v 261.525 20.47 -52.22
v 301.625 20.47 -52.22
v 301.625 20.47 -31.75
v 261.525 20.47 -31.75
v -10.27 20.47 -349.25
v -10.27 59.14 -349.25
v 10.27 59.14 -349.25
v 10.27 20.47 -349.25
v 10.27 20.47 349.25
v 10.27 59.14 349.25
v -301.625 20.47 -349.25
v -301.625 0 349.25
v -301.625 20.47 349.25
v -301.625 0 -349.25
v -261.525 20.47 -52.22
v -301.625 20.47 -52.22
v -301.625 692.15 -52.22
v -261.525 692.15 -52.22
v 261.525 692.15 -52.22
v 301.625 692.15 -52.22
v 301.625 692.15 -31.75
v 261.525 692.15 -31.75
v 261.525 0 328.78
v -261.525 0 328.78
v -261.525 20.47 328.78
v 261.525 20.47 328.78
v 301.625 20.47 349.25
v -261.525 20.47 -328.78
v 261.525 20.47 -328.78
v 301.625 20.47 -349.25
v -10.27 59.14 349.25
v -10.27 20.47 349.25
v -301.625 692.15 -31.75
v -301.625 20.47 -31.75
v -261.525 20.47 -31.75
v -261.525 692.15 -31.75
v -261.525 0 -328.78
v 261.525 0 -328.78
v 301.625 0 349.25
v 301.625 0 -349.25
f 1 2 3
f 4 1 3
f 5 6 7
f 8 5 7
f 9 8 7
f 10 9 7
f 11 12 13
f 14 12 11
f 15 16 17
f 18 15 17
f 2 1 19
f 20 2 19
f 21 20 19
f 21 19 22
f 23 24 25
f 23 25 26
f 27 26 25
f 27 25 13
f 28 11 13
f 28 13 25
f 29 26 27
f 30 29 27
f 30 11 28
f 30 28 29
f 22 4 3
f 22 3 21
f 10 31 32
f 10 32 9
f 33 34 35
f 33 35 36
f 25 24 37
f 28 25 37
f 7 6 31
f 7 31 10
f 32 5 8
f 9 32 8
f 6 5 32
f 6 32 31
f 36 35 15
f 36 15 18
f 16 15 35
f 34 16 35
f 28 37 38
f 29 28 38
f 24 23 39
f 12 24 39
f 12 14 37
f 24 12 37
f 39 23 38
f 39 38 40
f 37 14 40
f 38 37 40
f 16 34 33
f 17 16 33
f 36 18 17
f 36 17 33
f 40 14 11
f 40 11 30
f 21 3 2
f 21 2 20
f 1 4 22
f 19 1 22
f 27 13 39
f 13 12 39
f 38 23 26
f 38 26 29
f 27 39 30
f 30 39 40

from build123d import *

# Parameters (mm, degrees)
SKETCH1_W           = 603.25
SKETCH1_H           = 698.5
SKETCH1_W_2         = 523.05
SKETCH1_H_2         = 657.56
BOSS_EXTRUDE1_DEPTH = 20.47
SKETCH2_W           = 40.1
SKETCH2_H           = 20.47
BOSS_EXTRUDE2_DEPTH = 671.68
SKETCH3_W           = 20.54
SKETCH3_H           = 698.5
BOSS_EXTRUDE3_DEPTH = 38.67


with BuildPart() as part:
    # Sketch1 → Boss-Extrude1 (new body)
    with BuildSketch(Plane(origin=(0, 0, 0), x_dir=(1, 0, 0), z_dir=(0, 1, 0))):
        Rectangle(SKETCH1_W, SKETCH1_H)
        Rectangle(SKETCH1_W_2, SKETCH1_H_2, mode=Mode.SUBTRACT)
    extrude(amount=BOSS_EXTRUDE1_DEPTH)

    # Sketch2 → Boss-Extrude2 (add)
    with BuildSketch(Plane(origin=(0, 20.47, 0), x_dir=(1, 0, 0), z_dir=(0, 1, 0))):
        with Locations((-281.575, 41.985)):
            Rectangle(SKETCH2_W, SKETCH2_H)
        with Locations((281.575, 41.985)):
            Rectangle(SKETCH2_W, SKETCH2_H)
    extrude(amount=BOSS_EXTRUDE2_DEPTH)

    # Sketch3 → Boss-Extrude3 (add)
    with BuildSketch(Plane(origin=(0, 20.47, 0), x_dir=(1, 0, 0), z_dir=(0, 1, 0))):
        Rectangle(SKETCH3_W, SKETCH3_H)
    extrude(amount=BOSS_EXTRUDE3_DEPTH)


with BuildPart() as body_2:
    # Split1: the piece on the far side of the plane
    add(part.part)
    split(bisect_by=Plane(origin=(0, 20.47, 0), x_dir=(0, 0, -1), z_dir=(0, -1, 0)), keep=Keep.BOTTOM)


with BuildPart() as part_1:
    add(part.part)

    # Split1
    split(bisect_by=Plane(origin=(0, 20.47, 0), x_dir=(0, 0, -1), z_dir=(0, -1, 0)), keep=Keep.TOP)


solid = Compound([body_2.part, part_1.part])
